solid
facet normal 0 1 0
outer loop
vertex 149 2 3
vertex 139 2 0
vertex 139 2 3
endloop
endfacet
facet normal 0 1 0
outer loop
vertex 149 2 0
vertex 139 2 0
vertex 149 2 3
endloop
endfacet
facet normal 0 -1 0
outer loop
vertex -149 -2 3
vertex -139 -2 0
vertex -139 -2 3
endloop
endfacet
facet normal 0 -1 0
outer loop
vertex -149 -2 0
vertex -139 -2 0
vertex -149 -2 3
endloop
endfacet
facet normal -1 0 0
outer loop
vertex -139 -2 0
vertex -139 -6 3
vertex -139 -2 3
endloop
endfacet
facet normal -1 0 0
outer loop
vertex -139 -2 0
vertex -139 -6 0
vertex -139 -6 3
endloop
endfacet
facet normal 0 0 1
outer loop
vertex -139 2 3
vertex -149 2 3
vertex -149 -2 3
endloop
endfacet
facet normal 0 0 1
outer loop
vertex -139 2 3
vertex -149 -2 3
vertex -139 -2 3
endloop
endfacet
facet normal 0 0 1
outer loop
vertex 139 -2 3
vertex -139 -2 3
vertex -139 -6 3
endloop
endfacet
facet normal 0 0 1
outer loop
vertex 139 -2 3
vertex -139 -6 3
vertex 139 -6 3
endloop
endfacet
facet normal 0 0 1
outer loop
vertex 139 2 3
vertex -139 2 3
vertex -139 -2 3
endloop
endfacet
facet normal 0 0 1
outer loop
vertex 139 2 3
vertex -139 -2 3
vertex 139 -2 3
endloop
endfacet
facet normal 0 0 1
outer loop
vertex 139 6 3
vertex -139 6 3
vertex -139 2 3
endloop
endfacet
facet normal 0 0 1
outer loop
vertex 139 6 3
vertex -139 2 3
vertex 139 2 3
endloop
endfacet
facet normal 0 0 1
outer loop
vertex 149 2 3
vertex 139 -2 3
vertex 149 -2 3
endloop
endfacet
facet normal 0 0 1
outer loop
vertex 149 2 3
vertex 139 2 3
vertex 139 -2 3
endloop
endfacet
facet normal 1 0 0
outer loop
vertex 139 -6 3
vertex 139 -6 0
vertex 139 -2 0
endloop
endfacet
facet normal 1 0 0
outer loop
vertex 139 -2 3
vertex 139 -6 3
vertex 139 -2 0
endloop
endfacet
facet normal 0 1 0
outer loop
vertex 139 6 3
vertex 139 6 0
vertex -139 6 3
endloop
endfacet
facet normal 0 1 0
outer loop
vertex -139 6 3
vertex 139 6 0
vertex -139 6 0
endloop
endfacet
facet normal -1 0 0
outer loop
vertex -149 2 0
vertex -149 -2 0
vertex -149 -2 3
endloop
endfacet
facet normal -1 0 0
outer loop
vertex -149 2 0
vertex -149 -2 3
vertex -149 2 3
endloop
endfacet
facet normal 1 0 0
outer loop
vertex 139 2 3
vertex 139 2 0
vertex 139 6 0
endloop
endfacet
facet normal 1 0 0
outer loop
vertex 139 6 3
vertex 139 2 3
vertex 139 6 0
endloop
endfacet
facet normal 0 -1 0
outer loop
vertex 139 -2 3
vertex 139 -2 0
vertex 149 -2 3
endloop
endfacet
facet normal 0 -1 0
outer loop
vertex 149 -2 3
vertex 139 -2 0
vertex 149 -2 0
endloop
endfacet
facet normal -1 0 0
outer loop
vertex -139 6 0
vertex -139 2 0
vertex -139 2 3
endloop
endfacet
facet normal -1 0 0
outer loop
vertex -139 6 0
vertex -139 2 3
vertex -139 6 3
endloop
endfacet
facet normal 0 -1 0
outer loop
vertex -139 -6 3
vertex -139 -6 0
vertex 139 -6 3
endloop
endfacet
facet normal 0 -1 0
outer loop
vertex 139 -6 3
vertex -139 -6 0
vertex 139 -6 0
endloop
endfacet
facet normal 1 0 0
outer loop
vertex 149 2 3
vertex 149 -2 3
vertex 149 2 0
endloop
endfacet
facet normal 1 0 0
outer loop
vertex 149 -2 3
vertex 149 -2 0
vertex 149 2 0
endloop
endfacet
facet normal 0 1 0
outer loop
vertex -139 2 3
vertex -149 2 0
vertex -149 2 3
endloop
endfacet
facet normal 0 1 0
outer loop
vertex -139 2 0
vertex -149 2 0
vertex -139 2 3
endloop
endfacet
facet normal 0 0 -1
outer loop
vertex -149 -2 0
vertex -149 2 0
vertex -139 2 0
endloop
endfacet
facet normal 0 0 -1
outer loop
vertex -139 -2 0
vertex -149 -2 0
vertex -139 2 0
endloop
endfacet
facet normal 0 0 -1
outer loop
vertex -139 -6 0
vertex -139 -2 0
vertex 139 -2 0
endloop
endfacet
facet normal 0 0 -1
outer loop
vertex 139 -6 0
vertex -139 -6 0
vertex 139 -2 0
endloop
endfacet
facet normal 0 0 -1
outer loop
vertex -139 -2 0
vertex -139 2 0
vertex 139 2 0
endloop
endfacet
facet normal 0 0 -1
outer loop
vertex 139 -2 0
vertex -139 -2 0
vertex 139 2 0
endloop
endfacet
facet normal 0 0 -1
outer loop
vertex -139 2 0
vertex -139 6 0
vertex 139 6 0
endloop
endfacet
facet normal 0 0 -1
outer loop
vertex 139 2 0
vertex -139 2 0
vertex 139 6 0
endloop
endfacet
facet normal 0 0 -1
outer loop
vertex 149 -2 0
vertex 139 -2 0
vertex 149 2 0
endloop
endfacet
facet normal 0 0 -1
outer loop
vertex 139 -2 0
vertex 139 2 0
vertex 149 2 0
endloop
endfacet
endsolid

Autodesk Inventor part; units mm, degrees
ref_plane "YZ Plane" through (0, 0, 0) normal (1, 0, 0) x (0, 1, 0)
ref_plane "XY Plane" through (0, 0, 0) normal (0, 0, 1) x (1, 0, 0)
sketch "草圖1" plane through (0, 0, 0) normal (0, 0, 1) x (1, 0, 0)
  line L0 (0, 6) -> (0, -6)
  line L1 (0, -6) -> (-139, -6)
  line L2 (-139, -6) -> (-139, 6)
  line L3 (-149, 2) -> (-139, 2)
  line L4 (-139, 2) -> (-139, -2)
  line L5 (-139, -2) -> (-149, -2)
  line L6 (-149, -2) -> (-149, 2)
  line L7 (0, -9.6) -> (0, 15.6)
  line L8 (-148, -2) -> (-139, -2)
  line L9 (-139, -2) -> (-139, -6)
  line L10 (-139, 6) -> (-139, 2)
  line L11 (-139, 2) -> (-148, 2)
  line L12 (-139, 6) -> (0, 6)
  line L13 (139, -6) -> (139, 6)
  line L14 (139, 6) -> (139, 2)
  line L15 (139, -2) -> (139, -6)
  line L16 (139, 2) -> (148, 2)
  line L17 (149, 2) -> (139, 2)
  line L18 (148, -2) -> (139, -2)
  line L19 (139, -2) -> (149, -2)
  line L20 (149, -2) -> (149, 2)
  line L21 (139, 2) -> (139, -2)
  line L22 (0, -6) -> (139, -6)
  line L23 (139, 6) -> (0, 6)
  point P0 (0, 0)
  point P1 (0, 0)
  point P2 (0, 0)
  dimension "d0" = 10
  dimension "d1" = 139
  dimension "d2" = 4
extrude "擠出1" add sketch "草圖1" along normal blind 3
ref_plane "工作平面1" through (0, 0, 1.5) normal (0, 0, -1) x (-1, 0, 0)
properties part number "rod_3"
